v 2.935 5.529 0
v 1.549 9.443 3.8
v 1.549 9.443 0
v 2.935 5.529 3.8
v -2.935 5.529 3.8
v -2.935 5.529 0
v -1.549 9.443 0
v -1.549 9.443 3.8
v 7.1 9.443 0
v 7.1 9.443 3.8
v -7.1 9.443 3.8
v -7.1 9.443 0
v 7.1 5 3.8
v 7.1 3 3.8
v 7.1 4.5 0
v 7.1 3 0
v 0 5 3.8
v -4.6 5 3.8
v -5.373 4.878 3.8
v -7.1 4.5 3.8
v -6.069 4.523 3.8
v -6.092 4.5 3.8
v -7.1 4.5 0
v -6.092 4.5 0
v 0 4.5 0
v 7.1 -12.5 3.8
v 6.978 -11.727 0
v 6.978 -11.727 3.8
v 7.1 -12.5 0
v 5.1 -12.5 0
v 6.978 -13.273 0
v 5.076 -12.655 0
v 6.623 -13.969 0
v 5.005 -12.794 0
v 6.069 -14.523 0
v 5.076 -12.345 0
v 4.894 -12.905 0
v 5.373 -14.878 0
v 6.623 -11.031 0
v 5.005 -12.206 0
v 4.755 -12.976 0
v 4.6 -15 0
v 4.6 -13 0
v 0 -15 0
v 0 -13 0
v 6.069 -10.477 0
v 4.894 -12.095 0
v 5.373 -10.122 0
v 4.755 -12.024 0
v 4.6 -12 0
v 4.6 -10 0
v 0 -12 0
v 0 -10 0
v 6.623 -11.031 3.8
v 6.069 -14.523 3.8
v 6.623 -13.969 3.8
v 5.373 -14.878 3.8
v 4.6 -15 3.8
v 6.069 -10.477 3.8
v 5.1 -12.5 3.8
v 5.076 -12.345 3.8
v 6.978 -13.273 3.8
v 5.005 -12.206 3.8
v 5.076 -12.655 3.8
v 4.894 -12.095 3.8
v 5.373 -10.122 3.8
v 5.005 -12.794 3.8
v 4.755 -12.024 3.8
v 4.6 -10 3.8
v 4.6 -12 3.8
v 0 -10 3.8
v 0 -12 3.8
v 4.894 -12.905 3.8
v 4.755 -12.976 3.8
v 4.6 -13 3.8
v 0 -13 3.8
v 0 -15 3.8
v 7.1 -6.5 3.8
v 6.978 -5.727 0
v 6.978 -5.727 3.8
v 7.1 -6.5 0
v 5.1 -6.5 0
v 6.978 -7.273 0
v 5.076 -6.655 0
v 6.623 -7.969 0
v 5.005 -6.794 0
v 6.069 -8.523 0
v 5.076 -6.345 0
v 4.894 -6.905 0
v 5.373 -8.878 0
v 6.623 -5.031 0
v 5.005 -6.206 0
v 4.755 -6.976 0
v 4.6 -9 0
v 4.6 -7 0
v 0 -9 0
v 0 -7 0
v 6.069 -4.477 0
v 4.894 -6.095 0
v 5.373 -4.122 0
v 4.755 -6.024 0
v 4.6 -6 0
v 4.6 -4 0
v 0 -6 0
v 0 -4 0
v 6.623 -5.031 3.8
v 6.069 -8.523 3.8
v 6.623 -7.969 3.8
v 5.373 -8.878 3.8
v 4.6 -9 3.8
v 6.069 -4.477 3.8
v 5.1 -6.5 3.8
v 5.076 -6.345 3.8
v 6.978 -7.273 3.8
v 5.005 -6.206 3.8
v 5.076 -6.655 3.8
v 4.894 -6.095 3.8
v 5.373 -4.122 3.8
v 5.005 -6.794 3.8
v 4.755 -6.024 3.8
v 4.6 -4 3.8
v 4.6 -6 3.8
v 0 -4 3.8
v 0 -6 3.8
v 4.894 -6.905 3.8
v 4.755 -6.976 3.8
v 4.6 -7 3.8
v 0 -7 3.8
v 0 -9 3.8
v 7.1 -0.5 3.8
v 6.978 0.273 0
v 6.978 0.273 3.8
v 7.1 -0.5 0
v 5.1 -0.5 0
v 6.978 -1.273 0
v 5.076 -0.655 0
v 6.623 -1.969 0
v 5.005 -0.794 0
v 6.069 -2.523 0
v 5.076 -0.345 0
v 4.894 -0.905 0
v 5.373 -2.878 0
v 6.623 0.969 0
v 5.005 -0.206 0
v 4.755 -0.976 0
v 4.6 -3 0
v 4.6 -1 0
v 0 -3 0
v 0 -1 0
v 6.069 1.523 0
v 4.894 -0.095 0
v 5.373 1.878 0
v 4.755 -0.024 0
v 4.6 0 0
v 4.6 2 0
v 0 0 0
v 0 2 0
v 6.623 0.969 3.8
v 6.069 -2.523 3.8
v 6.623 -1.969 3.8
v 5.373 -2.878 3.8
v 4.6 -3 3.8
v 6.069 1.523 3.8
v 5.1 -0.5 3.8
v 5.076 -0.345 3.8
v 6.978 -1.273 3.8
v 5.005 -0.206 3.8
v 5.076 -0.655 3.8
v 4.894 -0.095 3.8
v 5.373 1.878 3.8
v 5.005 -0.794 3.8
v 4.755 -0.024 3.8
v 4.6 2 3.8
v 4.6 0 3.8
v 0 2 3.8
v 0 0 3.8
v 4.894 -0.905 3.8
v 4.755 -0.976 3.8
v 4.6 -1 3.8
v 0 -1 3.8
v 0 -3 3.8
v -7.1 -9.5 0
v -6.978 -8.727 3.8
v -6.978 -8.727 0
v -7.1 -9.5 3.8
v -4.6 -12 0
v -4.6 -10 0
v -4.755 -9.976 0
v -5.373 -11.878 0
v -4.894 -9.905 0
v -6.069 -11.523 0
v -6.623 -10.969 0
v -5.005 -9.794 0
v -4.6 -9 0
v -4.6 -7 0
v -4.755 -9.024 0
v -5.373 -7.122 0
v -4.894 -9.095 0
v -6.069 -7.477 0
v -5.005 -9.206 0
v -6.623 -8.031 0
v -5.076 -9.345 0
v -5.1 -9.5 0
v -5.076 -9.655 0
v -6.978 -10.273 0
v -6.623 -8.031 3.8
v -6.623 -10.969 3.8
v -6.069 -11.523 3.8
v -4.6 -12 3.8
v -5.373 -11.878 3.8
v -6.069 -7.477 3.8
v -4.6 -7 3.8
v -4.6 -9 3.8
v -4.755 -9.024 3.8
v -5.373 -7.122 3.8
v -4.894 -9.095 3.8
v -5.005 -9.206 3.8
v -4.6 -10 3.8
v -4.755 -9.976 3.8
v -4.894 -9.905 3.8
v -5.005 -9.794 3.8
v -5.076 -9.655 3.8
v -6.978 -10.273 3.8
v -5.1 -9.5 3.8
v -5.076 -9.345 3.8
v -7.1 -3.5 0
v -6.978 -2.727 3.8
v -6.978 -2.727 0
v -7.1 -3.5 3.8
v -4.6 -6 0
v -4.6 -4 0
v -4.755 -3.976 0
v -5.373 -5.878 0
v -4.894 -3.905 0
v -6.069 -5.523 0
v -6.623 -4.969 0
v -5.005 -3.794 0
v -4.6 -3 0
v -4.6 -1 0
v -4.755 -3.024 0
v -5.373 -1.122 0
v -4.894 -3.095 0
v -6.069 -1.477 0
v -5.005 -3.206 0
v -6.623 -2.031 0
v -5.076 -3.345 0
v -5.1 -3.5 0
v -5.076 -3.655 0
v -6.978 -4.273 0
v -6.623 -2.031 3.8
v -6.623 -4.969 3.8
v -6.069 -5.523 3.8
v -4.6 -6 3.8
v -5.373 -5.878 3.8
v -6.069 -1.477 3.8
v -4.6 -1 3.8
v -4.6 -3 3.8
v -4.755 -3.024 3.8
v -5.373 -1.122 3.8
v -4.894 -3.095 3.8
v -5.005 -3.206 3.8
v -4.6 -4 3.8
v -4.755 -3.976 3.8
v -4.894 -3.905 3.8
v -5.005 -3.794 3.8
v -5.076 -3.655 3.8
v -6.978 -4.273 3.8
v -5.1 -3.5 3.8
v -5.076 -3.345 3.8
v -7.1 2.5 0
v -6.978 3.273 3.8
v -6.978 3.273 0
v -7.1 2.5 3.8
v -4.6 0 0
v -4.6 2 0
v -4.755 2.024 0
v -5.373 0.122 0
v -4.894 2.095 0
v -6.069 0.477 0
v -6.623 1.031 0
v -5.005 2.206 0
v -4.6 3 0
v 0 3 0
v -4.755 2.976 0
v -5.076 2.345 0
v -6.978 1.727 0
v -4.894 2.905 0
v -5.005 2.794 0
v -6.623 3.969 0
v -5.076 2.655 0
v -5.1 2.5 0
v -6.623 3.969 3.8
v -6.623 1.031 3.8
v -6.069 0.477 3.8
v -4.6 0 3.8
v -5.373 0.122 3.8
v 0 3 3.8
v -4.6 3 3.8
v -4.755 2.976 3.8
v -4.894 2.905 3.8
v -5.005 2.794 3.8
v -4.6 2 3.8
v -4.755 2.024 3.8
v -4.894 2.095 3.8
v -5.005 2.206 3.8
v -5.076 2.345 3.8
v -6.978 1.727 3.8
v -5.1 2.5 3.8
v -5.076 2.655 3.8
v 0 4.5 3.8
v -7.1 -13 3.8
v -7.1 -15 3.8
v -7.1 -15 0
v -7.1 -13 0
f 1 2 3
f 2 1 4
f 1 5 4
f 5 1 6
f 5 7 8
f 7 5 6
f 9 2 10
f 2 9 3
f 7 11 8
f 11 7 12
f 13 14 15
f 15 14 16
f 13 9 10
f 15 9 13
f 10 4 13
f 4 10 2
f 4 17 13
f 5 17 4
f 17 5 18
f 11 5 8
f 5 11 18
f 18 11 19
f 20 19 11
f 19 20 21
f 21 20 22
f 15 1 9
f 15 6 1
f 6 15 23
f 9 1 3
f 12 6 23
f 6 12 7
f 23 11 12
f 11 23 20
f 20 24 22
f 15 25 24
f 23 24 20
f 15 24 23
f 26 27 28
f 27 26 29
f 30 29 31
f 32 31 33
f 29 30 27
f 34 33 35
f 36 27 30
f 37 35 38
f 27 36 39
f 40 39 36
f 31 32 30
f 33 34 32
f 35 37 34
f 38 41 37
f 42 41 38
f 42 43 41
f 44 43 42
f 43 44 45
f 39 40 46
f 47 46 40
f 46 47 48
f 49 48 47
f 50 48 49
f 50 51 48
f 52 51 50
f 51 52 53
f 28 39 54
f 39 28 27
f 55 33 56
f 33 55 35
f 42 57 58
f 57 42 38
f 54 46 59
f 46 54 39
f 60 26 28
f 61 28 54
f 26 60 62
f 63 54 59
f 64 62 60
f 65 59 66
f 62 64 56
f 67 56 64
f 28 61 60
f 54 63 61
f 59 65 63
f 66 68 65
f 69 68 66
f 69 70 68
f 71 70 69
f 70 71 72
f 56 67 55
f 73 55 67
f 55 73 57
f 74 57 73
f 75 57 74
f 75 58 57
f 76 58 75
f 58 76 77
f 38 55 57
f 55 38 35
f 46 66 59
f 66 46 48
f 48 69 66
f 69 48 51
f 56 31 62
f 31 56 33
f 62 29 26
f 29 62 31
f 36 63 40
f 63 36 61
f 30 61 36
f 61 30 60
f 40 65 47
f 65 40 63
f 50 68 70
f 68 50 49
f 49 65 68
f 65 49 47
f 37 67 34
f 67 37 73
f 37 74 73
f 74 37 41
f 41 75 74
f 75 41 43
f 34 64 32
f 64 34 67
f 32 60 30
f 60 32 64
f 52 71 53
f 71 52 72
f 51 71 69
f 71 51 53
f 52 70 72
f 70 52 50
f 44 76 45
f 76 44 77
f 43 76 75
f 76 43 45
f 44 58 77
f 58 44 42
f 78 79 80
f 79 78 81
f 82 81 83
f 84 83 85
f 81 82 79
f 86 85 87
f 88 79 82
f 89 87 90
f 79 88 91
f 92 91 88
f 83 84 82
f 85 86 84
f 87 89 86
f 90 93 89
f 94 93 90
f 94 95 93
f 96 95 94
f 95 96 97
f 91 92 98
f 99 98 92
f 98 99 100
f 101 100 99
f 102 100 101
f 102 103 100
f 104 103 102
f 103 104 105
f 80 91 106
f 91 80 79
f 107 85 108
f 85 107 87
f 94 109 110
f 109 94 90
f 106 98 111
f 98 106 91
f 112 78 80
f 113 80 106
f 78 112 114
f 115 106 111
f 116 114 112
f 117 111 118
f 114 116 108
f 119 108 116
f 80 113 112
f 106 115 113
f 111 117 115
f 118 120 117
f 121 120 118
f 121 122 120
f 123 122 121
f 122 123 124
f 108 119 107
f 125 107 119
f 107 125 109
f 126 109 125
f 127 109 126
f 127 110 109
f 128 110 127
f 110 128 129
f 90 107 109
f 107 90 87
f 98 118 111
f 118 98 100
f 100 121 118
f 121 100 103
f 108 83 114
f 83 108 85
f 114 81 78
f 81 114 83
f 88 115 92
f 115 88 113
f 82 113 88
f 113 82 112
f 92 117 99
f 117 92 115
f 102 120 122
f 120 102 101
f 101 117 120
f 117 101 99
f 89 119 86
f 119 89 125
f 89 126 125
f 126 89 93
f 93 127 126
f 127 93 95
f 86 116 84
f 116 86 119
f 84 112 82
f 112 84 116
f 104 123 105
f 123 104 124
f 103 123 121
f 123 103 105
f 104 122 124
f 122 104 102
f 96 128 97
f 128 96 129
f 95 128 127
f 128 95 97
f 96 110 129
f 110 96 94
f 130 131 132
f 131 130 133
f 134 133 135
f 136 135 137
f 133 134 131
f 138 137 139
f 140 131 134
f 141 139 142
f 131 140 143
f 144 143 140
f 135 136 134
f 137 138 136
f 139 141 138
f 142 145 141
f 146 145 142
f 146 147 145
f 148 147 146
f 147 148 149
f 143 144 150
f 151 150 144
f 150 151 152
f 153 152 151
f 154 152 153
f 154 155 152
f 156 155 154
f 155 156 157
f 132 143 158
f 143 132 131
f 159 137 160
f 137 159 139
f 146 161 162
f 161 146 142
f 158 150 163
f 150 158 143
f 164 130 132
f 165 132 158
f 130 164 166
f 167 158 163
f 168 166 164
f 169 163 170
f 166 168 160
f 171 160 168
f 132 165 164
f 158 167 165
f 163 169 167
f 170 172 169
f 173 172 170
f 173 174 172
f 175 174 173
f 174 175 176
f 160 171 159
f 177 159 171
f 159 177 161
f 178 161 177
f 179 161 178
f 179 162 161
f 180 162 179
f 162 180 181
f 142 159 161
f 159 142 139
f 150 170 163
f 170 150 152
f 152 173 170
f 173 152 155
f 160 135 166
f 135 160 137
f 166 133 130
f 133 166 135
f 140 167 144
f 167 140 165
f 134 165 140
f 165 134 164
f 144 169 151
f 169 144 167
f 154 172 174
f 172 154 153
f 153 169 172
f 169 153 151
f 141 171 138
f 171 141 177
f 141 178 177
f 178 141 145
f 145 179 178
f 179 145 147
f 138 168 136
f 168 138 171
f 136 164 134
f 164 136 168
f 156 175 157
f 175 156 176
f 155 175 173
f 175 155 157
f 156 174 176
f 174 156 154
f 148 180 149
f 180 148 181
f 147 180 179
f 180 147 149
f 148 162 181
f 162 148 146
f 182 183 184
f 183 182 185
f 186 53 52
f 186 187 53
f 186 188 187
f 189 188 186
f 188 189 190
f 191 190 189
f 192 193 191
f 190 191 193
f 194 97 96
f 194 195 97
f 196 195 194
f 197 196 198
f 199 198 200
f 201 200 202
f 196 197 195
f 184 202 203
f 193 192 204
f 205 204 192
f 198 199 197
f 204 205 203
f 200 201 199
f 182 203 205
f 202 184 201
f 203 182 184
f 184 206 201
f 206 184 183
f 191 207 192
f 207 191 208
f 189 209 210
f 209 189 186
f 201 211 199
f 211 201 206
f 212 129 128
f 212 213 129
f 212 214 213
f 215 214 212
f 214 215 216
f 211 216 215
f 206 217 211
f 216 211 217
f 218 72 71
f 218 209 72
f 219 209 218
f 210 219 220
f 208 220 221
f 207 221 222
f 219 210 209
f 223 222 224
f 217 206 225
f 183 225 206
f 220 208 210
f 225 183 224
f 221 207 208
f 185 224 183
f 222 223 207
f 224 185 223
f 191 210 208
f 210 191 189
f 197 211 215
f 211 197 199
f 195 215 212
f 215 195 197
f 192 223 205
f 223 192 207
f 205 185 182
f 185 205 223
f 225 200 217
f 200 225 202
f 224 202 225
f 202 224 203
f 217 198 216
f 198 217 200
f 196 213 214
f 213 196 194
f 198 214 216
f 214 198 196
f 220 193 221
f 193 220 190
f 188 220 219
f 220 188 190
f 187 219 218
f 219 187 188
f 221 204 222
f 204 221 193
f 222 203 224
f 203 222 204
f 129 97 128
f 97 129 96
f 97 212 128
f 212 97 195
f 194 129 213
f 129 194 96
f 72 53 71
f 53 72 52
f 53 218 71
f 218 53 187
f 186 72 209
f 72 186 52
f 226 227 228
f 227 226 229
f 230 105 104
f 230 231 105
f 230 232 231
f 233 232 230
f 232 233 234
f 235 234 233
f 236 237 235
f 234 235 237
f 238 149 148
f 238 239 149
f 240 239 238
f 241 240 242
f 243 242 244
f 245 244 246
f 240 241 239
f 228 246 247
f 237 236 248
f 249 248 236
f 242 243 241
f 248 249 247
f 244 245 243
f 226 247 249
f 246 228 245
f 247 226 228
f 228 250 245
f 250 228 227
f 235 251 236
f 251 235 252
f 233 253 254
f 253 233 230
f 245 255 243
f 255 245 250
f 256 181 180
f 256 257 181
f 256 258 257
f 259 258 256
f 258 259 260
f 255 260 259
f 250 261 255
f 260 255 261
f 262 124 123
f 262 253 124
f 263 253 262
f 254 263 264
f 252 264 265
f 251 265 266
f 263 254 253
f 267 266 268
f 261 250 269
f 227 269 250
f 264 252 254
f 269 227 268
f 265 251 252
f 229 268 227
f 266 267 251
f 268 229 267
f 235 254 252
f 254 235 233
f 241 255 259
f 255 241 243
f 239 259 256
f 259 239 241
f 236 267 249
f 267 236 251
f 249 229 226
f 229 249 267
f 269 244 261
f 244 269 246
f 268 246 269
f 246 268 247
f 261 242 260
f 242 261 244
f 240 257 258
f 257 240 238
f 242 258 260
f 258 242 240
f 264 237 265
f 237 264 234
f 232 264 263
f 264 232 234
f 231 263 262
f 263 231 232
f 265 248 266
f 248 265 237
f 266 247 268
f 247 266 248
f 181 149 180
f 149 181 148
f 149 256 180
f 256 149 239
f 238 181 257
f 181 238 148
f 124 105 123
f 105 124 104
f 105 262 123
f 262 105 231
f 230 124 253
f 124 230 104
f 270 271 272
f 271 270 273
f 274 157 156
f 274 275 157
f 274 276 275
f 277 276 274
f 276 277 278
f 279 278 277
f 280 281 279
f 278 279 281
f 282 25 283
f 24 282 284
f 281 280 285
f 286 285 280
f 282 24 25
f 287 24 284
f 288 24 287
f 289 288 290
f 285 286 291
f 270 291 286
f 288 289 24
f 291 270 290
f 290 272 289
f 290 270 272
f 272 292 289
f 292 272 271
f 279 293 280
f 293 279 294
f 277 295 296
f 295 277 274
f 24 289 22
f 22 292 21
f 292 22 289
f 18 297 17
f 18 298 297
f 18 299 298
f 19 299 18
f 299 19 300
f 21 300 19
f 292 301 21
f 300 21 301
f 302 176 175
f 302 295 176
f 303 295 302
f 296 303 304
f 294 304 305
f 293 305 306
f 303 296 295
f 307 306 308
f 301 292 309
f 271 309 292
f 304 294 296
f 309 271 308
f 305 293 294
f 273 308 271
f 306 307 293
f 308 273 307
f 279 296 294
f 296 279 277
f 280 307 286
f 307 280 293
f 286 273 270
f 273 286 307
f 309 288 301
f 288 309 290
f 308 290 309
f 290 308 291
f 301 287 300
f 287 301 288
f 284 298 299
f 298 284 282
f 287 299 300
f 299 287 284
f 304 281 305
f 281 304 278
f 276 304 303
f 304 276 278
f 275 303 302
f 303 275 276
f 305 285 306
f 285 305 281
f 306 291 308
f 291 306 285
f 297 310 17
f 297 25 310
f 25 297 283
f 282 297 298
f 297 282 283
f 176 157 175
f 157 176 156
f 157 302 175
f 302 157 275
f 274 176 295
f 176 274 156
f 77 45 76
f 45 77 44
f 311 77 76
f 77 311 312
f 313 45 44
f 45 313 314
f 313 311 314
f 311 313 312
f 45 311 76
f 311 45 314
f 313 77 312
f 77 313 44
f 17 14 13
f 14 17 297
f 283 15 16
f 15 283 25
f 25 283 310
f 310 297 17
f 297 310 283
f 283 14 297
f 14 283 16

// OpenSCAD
// file: spacer.scad
$fn = 30;
SPACER_LENGTH = 6;

ARM_THICKNESS = 3.8;

ARMS_SPACING = 20;
ARM_WIDTH = 20;

module spacer(length, width, thickness, support = false) {

    BLOCKER_THICKNESS = 2;
    SPACE = 0.3;
    CLEAR = 0.7;

    MAIN_HOLE_DIAMETER = 2.5;

    SCREW_DIAMETER = 2.7;
    NUT_DIAMETER = 6;
    NUT_HEIGHT = 1.9;

    difference() {
        union() {
            cube([ length, width, thickness ], center = true);

            translate([0, 0, - SPACE / 2]) {
                cube(size = [ length + thickness * 2 + CLEAR * 2, SPACER_LENGTH - SPACE, ARM_THICKNESS - SPACE ], center = true);
            }

            if (support) {
                translate([ 0, 0, thickness / 2]) {
                    cylinder(r = 10, h = thickness);
                }
            } else {
                translate([ 0, 0, thickness ]) {
                    //%cube(size = [ length, SPACER_LENGTH - SPACE, thickness ], center = true);
                }

                translate([ - length / 2, 0, thickness / 2 - 0.01 ]) {
                    rotate([90, 0, 90])
                    linear_extrude(height = length) {
                        polygon([[-1.5,0],[-(SPACER_LENGTH - SPACE) / 2, thickness + 0.01],[(SPACER_LENGTH - SPACE) / 2,thickness + 0.01],[1.5,0]]);
                    }
                }

                translate([ 0, 0, thickness / 2]) {
                    cylinder(r = 5, h = thickness);
                }
            }

            // Blocker
            translate([ - (length + thickness * 2) / 2 - BLOCKER_THICKNESS / 2 - CLEAR, 0, -SPACE / 2 ]) {
                cube(size = [ BLOCKER_THICKNESS, SPACER_LENGTH - SPACE + 2, ARM_THICKNESS - SPACE ], center = true);
            }

            translate([ (length + thickness * 2) / 2 + BLOCKER_THICKNESS / 2 + CLEAR, 0, -SPACE / 2 ]) {
                cube(size = [ BLOCKER_THICKNESS, SPACER_LENGTH - SPACE + 2, ARM_THICKNESS - SPACE ], center = true);
            }
        }

        // Main hole
        translate([ 0, 0, -10]) {
            cylinder(r = MAIN_HOLE_DIAMETER, h = 20);
        }

        if (support) {
            // Small hole
            for (i = [0 : 3]) {
                rotate([0, 0, i * 90]) {

                    translate([-(length / 4 + MAIN_HOLE_DIAMETER / 2), 0, -5]) {
                        cylinder(r = SCREW_DIAMETER / 2, h = 20);

                        // Nut
                        translate([0, 0, ARM_THICKNESS + 5 + 0.01]) {
                            rotate([0, 0, 90])
                                cylinder(r = NUT_DIAMETER / 2, h = NUT_HEIGHT, $fn = 6);
                        }
                    }
                }
            }
        }
    }
}

if (1) {
    // Small
    //spacer(ARMS_SPACING, ARM_WIDTH, ARM_THICKNESS, true);

    // Large
    /*
    difference() {
        intersection() {
            translate([15, 0, 0]) {
                cube(size = [ 15, 30, 20 ], center = true);
            }
            spacer(ARMS_SPACING + ARM_THICKNESS * 2 - 1, 15, ARM_THICKNESS);
        }
        translate([20, 0, 0]) {
            cube(size = [ 15, 30, 20 ], center = true);
        }
    }
    */

            spacer(ARMS_SPACING + ARM_THICKNESS * 2 - 1, 15, ARM_THICKNESS);
}
// file: lib/spring.scad
//---------------------------------------------------------------------------------------------
//-- Printable parameterized spring
//-- (c) Juan Gonzalez-Gomez (Obijuan) juan@iearobotics.com
//-- April-2012
//---------------------------------------------------------------------------------------------
//-- Proof of concept
//---------------------------------------------------------------------------------------------


//-- Spring folds. It is implemented by means of arcs
//-- It consist of two parts: the arc and the arms
//-- r = Inner arc radius
//-- th = thickness
//-- w = width
//-- arc_len = Length of the two arms
module spring_arc(arm_len, r, th, w)
{
  //-- outer radius
  or = r + th; 

  translate([arm_len,or,0])
  union() {

    //-- Arc
    difference() {
      cylinder(r=or, h=w, center=true, $fn=20);

      translate([-or,0,0])
          cube([2*or, 2*or+2, w+2],center=true);

      cylinder(r=r, h=w+10, center=true, $fn=20);

    }

    //-- Arms
    translate([-arm_len/2,th/2+r,0])
      cube([arm_len,th,w],center=true);

    translate([-arm_len/2,-th/2-r,0])
      cube([arm_len,th,w],center=true);
  }
}

//---------------------------------------------------------
//-- This module creates the spring, with a square section
//-- and no drills
//-- Spring parameters:
//--  -fid: Fold inner diameter
//--  -th: thickness 
//--  -folds: Number of folds: starting from 1
//--  -lx,lz: Spring length on x and z axes respectively
//--------------------------------------------------------
module parametric_spring_common(fid=3, th=2, folds=8, lx=20, lz=20)
{

  step = 2*(fid + th);
  arm_len = (lx - fid - 2*th)/2;
  ly = folds*step/2;

  translate([0,-ly/2,0])
  union() {

    //-- Right folds
    for (i=[1:ceil(folds/2)]) {
      translate([0, (i-1)*step,0])
        spring_arc(arm_len=arm_len, r=fid/2, th=th, w=lz);
    }

    //-- left folds
    if (folds>1) {
      for (i=[1:floor(folds/2)]) {
        translate([0, (i-1)*step+step/2,0])
          mirror([1,0,0])
          spring_arc(arm_len=arm_len, r=fid/2, th=th, w=lz);
      }
    }

    translate([-lx/4,th/2,0])
      cube([lx/2,th,lz], center=true);

    if ((folds%2)==0)
      translate([lx/4, th/2+(step/2)*folds,0])
        cube([lx/2,th,lz], center=true);
    else
      translate([-lx/4, th/2+(step/2)*folds,0])
        cube([lx/2,th,lz], center=true);
  }
}

module teardrop(r,h)
{
  $fa=15.0;
  $fs=0.1;

  diameter=2*r;

  translate([0,0,-h/2])
  linear_extrude(height=h, center=false, convexity=10)
  difference() {
    union() {
      circle(r=diameter/2);
      rotate(45) square(size=diameter/2,center=false);
    }
    translate([-diameter/2,diameter/2]) square(size=diameter);
  }
}

module pipe(hexa_diam=12, len=5, offs=0, sides=6)
{
  out_diam = 4*(hexa_diam/2 * cos(360/(2*sides)));


  difference() {
    rotate([90,0,0])
     cylinder(r=out_diam/2, h=len+10,center=true, $fn=sides);

    rotate([90,0,0])
     cylinder(r=hexa_diam/2+offs, h=len+15,center=true, $fn=sides);
  }
}

//---------------------------------------------
//-- Spring MAIN MODULES!
//-- Common parameters:
//--     -fid = folder inner diameter
//--     -th = thickness
//--     -folds = Number of folds in the spring
//--     -drill = Inner drill
//---------------------------------------------


//-------------------------------------
//-- Spring with a squeare section
//-- Specific parameters:
//--    lx, lz : square lenths
//-------------------------------------
module spring_square(fid=3, th=2, folds=8, lx=20, lz=20,drill=8)
{
  step = 2*(fid + th);
  arm_len = (lx - fid - 2*th)/2;
  ly = folds*(fid + th);
  echo(ly);

  difference() {
    parametric_spring_common(fid=fid,th=th, folds=folds, lx=lx, lz=lz);

    rotate([90,0,0])
      teardrop(r=drill/2,h=ly+10);
      //cylinder(r=drill/2, h=ly+10, center=true, $fn=20);
  }
}

//-----------------------------------------------------------------------
//-- Spring with an hexagonal section 
//-- Specific parameters:
//--    hexa_diam: external diameter
//--    offs: Additional distance added to the hexa_diam to 
//--      for changing the shape. When offs=0, it is a regular hexagon
//----------------------------------------------------------------------
module spring_hexagonal(fid=3, th=2, folds=8, hexa_diam=13 ,drill=8,offs=0)
{
   ly = folds*(fid + th);
  lx = hexa_diam;
  lz = 2*(hexa_diam/2 * cos(30));
  step = 2*(fid + th);
  arm_len = (lx - fid - 2*th)/2;
 

  difference() {
    parametric_spring_common(fid=fid,th=th, folds=folds, lx=lx, lz=lz);

    rotate([90,0,0])
      //cylinder(r=drill/2, h=ly+10, center=true, $fn=20);
      teardrop(r=drill/2,h=ly+10);

    pipe(hexa_diam=hexa_diam, len=ly,offs=offs,sides=6);
  }
}


//-----------------------------------------------------------------------
//-- Spring with an octogonal section 
//-- Specific parameters:
//--    hexa_diam: external diameter
//--    offs: Additional distance added to the hexa_diam to 
//--      for changing the shape. When offs=0, it is a regular hexagon
//----------------------------------------------------------------------
module spring_octogonal(fid=3, th=2, folds=8, hexa_diam=13 ,drill=8,offs=0)
{
   ly = folds*(fid + th);
  lx = hexa_diam;
  lz = 2*(hexa_diam/2 * cos(30));
  step = 2*(fid + th);
  arm_len = (lx - fid - 2*th)/2;
  echo(ly);

  difference() {
    parametric_spring_common(fid=fid,th=th, folds=folds, lx=lx, lz=lz);

    rotate([90,0,0])
      //cylinder(r=drill/2, h=ly+10, center=true, $fn=20);
      teardrop(r=drill/2,h=ly+10);

    rotate([0,45/2,0])
    pipe(hexa_diam=hexa_diam, len=ly,offs=offs, sides=8);
  }
}

//-- Example springs!

translate([-30,0,0])
spring_square(fid=9, th=2.8, folds=7, lx=22.2, lz=5, drill=0);

/*
//-- This is the one used as a z axis spring on the Prusa Mendel
translate([0,0,0])
spring_hexagonal(fid=3, th=2, folds=4, hexa_diam=14.6, drill=8, offs=0);

translate([30,0,0])
spring_octogonal(fid=4, th=2, folds=6, hexa_diam=22, drill=14);
*/
// main file
use <lib/spring.scad>
use <spacer.scad>

$fn = 30;
ARM_THICKNESS = 3.8;
ARMS_SPACING = 20;

DEBUG = true;

module spring(only_connection = false) {
    thickness = ARM_THICKNESS;
    offset = only_connection ? 10 : 0;
    clear = 1.03;

    if (!only_connection) {

        difference() {
            translate([0, 7, ARM_THICKNESS / 2]) {
                cube(size = [14.2, 5, ARM_THICKNESS], center = true);
            }

            rotate([0, 90, -90]) {
                translate([9.9, 0, -11.4]) {
                    scale([clear, clear, clear]) {
                        spacer(ARMS_SPACING + ARM_THICKNESS * 2, 15, ARM_THICKNESS);
                    }

                    if (DEBUG) {
                        %spacer(ARMS_SPACING + ARM_THICKNESS * 2, 15, ARM_THICKNESS);
                    }
                }
            }
        }

        difference() {
            translate([0, -6, thickness / 2]) {
                spring_square(fid=1, th=2, folds=6, lx=14.2, lz=thickness, drill=0);
            }
        }
    }
}

spring();
